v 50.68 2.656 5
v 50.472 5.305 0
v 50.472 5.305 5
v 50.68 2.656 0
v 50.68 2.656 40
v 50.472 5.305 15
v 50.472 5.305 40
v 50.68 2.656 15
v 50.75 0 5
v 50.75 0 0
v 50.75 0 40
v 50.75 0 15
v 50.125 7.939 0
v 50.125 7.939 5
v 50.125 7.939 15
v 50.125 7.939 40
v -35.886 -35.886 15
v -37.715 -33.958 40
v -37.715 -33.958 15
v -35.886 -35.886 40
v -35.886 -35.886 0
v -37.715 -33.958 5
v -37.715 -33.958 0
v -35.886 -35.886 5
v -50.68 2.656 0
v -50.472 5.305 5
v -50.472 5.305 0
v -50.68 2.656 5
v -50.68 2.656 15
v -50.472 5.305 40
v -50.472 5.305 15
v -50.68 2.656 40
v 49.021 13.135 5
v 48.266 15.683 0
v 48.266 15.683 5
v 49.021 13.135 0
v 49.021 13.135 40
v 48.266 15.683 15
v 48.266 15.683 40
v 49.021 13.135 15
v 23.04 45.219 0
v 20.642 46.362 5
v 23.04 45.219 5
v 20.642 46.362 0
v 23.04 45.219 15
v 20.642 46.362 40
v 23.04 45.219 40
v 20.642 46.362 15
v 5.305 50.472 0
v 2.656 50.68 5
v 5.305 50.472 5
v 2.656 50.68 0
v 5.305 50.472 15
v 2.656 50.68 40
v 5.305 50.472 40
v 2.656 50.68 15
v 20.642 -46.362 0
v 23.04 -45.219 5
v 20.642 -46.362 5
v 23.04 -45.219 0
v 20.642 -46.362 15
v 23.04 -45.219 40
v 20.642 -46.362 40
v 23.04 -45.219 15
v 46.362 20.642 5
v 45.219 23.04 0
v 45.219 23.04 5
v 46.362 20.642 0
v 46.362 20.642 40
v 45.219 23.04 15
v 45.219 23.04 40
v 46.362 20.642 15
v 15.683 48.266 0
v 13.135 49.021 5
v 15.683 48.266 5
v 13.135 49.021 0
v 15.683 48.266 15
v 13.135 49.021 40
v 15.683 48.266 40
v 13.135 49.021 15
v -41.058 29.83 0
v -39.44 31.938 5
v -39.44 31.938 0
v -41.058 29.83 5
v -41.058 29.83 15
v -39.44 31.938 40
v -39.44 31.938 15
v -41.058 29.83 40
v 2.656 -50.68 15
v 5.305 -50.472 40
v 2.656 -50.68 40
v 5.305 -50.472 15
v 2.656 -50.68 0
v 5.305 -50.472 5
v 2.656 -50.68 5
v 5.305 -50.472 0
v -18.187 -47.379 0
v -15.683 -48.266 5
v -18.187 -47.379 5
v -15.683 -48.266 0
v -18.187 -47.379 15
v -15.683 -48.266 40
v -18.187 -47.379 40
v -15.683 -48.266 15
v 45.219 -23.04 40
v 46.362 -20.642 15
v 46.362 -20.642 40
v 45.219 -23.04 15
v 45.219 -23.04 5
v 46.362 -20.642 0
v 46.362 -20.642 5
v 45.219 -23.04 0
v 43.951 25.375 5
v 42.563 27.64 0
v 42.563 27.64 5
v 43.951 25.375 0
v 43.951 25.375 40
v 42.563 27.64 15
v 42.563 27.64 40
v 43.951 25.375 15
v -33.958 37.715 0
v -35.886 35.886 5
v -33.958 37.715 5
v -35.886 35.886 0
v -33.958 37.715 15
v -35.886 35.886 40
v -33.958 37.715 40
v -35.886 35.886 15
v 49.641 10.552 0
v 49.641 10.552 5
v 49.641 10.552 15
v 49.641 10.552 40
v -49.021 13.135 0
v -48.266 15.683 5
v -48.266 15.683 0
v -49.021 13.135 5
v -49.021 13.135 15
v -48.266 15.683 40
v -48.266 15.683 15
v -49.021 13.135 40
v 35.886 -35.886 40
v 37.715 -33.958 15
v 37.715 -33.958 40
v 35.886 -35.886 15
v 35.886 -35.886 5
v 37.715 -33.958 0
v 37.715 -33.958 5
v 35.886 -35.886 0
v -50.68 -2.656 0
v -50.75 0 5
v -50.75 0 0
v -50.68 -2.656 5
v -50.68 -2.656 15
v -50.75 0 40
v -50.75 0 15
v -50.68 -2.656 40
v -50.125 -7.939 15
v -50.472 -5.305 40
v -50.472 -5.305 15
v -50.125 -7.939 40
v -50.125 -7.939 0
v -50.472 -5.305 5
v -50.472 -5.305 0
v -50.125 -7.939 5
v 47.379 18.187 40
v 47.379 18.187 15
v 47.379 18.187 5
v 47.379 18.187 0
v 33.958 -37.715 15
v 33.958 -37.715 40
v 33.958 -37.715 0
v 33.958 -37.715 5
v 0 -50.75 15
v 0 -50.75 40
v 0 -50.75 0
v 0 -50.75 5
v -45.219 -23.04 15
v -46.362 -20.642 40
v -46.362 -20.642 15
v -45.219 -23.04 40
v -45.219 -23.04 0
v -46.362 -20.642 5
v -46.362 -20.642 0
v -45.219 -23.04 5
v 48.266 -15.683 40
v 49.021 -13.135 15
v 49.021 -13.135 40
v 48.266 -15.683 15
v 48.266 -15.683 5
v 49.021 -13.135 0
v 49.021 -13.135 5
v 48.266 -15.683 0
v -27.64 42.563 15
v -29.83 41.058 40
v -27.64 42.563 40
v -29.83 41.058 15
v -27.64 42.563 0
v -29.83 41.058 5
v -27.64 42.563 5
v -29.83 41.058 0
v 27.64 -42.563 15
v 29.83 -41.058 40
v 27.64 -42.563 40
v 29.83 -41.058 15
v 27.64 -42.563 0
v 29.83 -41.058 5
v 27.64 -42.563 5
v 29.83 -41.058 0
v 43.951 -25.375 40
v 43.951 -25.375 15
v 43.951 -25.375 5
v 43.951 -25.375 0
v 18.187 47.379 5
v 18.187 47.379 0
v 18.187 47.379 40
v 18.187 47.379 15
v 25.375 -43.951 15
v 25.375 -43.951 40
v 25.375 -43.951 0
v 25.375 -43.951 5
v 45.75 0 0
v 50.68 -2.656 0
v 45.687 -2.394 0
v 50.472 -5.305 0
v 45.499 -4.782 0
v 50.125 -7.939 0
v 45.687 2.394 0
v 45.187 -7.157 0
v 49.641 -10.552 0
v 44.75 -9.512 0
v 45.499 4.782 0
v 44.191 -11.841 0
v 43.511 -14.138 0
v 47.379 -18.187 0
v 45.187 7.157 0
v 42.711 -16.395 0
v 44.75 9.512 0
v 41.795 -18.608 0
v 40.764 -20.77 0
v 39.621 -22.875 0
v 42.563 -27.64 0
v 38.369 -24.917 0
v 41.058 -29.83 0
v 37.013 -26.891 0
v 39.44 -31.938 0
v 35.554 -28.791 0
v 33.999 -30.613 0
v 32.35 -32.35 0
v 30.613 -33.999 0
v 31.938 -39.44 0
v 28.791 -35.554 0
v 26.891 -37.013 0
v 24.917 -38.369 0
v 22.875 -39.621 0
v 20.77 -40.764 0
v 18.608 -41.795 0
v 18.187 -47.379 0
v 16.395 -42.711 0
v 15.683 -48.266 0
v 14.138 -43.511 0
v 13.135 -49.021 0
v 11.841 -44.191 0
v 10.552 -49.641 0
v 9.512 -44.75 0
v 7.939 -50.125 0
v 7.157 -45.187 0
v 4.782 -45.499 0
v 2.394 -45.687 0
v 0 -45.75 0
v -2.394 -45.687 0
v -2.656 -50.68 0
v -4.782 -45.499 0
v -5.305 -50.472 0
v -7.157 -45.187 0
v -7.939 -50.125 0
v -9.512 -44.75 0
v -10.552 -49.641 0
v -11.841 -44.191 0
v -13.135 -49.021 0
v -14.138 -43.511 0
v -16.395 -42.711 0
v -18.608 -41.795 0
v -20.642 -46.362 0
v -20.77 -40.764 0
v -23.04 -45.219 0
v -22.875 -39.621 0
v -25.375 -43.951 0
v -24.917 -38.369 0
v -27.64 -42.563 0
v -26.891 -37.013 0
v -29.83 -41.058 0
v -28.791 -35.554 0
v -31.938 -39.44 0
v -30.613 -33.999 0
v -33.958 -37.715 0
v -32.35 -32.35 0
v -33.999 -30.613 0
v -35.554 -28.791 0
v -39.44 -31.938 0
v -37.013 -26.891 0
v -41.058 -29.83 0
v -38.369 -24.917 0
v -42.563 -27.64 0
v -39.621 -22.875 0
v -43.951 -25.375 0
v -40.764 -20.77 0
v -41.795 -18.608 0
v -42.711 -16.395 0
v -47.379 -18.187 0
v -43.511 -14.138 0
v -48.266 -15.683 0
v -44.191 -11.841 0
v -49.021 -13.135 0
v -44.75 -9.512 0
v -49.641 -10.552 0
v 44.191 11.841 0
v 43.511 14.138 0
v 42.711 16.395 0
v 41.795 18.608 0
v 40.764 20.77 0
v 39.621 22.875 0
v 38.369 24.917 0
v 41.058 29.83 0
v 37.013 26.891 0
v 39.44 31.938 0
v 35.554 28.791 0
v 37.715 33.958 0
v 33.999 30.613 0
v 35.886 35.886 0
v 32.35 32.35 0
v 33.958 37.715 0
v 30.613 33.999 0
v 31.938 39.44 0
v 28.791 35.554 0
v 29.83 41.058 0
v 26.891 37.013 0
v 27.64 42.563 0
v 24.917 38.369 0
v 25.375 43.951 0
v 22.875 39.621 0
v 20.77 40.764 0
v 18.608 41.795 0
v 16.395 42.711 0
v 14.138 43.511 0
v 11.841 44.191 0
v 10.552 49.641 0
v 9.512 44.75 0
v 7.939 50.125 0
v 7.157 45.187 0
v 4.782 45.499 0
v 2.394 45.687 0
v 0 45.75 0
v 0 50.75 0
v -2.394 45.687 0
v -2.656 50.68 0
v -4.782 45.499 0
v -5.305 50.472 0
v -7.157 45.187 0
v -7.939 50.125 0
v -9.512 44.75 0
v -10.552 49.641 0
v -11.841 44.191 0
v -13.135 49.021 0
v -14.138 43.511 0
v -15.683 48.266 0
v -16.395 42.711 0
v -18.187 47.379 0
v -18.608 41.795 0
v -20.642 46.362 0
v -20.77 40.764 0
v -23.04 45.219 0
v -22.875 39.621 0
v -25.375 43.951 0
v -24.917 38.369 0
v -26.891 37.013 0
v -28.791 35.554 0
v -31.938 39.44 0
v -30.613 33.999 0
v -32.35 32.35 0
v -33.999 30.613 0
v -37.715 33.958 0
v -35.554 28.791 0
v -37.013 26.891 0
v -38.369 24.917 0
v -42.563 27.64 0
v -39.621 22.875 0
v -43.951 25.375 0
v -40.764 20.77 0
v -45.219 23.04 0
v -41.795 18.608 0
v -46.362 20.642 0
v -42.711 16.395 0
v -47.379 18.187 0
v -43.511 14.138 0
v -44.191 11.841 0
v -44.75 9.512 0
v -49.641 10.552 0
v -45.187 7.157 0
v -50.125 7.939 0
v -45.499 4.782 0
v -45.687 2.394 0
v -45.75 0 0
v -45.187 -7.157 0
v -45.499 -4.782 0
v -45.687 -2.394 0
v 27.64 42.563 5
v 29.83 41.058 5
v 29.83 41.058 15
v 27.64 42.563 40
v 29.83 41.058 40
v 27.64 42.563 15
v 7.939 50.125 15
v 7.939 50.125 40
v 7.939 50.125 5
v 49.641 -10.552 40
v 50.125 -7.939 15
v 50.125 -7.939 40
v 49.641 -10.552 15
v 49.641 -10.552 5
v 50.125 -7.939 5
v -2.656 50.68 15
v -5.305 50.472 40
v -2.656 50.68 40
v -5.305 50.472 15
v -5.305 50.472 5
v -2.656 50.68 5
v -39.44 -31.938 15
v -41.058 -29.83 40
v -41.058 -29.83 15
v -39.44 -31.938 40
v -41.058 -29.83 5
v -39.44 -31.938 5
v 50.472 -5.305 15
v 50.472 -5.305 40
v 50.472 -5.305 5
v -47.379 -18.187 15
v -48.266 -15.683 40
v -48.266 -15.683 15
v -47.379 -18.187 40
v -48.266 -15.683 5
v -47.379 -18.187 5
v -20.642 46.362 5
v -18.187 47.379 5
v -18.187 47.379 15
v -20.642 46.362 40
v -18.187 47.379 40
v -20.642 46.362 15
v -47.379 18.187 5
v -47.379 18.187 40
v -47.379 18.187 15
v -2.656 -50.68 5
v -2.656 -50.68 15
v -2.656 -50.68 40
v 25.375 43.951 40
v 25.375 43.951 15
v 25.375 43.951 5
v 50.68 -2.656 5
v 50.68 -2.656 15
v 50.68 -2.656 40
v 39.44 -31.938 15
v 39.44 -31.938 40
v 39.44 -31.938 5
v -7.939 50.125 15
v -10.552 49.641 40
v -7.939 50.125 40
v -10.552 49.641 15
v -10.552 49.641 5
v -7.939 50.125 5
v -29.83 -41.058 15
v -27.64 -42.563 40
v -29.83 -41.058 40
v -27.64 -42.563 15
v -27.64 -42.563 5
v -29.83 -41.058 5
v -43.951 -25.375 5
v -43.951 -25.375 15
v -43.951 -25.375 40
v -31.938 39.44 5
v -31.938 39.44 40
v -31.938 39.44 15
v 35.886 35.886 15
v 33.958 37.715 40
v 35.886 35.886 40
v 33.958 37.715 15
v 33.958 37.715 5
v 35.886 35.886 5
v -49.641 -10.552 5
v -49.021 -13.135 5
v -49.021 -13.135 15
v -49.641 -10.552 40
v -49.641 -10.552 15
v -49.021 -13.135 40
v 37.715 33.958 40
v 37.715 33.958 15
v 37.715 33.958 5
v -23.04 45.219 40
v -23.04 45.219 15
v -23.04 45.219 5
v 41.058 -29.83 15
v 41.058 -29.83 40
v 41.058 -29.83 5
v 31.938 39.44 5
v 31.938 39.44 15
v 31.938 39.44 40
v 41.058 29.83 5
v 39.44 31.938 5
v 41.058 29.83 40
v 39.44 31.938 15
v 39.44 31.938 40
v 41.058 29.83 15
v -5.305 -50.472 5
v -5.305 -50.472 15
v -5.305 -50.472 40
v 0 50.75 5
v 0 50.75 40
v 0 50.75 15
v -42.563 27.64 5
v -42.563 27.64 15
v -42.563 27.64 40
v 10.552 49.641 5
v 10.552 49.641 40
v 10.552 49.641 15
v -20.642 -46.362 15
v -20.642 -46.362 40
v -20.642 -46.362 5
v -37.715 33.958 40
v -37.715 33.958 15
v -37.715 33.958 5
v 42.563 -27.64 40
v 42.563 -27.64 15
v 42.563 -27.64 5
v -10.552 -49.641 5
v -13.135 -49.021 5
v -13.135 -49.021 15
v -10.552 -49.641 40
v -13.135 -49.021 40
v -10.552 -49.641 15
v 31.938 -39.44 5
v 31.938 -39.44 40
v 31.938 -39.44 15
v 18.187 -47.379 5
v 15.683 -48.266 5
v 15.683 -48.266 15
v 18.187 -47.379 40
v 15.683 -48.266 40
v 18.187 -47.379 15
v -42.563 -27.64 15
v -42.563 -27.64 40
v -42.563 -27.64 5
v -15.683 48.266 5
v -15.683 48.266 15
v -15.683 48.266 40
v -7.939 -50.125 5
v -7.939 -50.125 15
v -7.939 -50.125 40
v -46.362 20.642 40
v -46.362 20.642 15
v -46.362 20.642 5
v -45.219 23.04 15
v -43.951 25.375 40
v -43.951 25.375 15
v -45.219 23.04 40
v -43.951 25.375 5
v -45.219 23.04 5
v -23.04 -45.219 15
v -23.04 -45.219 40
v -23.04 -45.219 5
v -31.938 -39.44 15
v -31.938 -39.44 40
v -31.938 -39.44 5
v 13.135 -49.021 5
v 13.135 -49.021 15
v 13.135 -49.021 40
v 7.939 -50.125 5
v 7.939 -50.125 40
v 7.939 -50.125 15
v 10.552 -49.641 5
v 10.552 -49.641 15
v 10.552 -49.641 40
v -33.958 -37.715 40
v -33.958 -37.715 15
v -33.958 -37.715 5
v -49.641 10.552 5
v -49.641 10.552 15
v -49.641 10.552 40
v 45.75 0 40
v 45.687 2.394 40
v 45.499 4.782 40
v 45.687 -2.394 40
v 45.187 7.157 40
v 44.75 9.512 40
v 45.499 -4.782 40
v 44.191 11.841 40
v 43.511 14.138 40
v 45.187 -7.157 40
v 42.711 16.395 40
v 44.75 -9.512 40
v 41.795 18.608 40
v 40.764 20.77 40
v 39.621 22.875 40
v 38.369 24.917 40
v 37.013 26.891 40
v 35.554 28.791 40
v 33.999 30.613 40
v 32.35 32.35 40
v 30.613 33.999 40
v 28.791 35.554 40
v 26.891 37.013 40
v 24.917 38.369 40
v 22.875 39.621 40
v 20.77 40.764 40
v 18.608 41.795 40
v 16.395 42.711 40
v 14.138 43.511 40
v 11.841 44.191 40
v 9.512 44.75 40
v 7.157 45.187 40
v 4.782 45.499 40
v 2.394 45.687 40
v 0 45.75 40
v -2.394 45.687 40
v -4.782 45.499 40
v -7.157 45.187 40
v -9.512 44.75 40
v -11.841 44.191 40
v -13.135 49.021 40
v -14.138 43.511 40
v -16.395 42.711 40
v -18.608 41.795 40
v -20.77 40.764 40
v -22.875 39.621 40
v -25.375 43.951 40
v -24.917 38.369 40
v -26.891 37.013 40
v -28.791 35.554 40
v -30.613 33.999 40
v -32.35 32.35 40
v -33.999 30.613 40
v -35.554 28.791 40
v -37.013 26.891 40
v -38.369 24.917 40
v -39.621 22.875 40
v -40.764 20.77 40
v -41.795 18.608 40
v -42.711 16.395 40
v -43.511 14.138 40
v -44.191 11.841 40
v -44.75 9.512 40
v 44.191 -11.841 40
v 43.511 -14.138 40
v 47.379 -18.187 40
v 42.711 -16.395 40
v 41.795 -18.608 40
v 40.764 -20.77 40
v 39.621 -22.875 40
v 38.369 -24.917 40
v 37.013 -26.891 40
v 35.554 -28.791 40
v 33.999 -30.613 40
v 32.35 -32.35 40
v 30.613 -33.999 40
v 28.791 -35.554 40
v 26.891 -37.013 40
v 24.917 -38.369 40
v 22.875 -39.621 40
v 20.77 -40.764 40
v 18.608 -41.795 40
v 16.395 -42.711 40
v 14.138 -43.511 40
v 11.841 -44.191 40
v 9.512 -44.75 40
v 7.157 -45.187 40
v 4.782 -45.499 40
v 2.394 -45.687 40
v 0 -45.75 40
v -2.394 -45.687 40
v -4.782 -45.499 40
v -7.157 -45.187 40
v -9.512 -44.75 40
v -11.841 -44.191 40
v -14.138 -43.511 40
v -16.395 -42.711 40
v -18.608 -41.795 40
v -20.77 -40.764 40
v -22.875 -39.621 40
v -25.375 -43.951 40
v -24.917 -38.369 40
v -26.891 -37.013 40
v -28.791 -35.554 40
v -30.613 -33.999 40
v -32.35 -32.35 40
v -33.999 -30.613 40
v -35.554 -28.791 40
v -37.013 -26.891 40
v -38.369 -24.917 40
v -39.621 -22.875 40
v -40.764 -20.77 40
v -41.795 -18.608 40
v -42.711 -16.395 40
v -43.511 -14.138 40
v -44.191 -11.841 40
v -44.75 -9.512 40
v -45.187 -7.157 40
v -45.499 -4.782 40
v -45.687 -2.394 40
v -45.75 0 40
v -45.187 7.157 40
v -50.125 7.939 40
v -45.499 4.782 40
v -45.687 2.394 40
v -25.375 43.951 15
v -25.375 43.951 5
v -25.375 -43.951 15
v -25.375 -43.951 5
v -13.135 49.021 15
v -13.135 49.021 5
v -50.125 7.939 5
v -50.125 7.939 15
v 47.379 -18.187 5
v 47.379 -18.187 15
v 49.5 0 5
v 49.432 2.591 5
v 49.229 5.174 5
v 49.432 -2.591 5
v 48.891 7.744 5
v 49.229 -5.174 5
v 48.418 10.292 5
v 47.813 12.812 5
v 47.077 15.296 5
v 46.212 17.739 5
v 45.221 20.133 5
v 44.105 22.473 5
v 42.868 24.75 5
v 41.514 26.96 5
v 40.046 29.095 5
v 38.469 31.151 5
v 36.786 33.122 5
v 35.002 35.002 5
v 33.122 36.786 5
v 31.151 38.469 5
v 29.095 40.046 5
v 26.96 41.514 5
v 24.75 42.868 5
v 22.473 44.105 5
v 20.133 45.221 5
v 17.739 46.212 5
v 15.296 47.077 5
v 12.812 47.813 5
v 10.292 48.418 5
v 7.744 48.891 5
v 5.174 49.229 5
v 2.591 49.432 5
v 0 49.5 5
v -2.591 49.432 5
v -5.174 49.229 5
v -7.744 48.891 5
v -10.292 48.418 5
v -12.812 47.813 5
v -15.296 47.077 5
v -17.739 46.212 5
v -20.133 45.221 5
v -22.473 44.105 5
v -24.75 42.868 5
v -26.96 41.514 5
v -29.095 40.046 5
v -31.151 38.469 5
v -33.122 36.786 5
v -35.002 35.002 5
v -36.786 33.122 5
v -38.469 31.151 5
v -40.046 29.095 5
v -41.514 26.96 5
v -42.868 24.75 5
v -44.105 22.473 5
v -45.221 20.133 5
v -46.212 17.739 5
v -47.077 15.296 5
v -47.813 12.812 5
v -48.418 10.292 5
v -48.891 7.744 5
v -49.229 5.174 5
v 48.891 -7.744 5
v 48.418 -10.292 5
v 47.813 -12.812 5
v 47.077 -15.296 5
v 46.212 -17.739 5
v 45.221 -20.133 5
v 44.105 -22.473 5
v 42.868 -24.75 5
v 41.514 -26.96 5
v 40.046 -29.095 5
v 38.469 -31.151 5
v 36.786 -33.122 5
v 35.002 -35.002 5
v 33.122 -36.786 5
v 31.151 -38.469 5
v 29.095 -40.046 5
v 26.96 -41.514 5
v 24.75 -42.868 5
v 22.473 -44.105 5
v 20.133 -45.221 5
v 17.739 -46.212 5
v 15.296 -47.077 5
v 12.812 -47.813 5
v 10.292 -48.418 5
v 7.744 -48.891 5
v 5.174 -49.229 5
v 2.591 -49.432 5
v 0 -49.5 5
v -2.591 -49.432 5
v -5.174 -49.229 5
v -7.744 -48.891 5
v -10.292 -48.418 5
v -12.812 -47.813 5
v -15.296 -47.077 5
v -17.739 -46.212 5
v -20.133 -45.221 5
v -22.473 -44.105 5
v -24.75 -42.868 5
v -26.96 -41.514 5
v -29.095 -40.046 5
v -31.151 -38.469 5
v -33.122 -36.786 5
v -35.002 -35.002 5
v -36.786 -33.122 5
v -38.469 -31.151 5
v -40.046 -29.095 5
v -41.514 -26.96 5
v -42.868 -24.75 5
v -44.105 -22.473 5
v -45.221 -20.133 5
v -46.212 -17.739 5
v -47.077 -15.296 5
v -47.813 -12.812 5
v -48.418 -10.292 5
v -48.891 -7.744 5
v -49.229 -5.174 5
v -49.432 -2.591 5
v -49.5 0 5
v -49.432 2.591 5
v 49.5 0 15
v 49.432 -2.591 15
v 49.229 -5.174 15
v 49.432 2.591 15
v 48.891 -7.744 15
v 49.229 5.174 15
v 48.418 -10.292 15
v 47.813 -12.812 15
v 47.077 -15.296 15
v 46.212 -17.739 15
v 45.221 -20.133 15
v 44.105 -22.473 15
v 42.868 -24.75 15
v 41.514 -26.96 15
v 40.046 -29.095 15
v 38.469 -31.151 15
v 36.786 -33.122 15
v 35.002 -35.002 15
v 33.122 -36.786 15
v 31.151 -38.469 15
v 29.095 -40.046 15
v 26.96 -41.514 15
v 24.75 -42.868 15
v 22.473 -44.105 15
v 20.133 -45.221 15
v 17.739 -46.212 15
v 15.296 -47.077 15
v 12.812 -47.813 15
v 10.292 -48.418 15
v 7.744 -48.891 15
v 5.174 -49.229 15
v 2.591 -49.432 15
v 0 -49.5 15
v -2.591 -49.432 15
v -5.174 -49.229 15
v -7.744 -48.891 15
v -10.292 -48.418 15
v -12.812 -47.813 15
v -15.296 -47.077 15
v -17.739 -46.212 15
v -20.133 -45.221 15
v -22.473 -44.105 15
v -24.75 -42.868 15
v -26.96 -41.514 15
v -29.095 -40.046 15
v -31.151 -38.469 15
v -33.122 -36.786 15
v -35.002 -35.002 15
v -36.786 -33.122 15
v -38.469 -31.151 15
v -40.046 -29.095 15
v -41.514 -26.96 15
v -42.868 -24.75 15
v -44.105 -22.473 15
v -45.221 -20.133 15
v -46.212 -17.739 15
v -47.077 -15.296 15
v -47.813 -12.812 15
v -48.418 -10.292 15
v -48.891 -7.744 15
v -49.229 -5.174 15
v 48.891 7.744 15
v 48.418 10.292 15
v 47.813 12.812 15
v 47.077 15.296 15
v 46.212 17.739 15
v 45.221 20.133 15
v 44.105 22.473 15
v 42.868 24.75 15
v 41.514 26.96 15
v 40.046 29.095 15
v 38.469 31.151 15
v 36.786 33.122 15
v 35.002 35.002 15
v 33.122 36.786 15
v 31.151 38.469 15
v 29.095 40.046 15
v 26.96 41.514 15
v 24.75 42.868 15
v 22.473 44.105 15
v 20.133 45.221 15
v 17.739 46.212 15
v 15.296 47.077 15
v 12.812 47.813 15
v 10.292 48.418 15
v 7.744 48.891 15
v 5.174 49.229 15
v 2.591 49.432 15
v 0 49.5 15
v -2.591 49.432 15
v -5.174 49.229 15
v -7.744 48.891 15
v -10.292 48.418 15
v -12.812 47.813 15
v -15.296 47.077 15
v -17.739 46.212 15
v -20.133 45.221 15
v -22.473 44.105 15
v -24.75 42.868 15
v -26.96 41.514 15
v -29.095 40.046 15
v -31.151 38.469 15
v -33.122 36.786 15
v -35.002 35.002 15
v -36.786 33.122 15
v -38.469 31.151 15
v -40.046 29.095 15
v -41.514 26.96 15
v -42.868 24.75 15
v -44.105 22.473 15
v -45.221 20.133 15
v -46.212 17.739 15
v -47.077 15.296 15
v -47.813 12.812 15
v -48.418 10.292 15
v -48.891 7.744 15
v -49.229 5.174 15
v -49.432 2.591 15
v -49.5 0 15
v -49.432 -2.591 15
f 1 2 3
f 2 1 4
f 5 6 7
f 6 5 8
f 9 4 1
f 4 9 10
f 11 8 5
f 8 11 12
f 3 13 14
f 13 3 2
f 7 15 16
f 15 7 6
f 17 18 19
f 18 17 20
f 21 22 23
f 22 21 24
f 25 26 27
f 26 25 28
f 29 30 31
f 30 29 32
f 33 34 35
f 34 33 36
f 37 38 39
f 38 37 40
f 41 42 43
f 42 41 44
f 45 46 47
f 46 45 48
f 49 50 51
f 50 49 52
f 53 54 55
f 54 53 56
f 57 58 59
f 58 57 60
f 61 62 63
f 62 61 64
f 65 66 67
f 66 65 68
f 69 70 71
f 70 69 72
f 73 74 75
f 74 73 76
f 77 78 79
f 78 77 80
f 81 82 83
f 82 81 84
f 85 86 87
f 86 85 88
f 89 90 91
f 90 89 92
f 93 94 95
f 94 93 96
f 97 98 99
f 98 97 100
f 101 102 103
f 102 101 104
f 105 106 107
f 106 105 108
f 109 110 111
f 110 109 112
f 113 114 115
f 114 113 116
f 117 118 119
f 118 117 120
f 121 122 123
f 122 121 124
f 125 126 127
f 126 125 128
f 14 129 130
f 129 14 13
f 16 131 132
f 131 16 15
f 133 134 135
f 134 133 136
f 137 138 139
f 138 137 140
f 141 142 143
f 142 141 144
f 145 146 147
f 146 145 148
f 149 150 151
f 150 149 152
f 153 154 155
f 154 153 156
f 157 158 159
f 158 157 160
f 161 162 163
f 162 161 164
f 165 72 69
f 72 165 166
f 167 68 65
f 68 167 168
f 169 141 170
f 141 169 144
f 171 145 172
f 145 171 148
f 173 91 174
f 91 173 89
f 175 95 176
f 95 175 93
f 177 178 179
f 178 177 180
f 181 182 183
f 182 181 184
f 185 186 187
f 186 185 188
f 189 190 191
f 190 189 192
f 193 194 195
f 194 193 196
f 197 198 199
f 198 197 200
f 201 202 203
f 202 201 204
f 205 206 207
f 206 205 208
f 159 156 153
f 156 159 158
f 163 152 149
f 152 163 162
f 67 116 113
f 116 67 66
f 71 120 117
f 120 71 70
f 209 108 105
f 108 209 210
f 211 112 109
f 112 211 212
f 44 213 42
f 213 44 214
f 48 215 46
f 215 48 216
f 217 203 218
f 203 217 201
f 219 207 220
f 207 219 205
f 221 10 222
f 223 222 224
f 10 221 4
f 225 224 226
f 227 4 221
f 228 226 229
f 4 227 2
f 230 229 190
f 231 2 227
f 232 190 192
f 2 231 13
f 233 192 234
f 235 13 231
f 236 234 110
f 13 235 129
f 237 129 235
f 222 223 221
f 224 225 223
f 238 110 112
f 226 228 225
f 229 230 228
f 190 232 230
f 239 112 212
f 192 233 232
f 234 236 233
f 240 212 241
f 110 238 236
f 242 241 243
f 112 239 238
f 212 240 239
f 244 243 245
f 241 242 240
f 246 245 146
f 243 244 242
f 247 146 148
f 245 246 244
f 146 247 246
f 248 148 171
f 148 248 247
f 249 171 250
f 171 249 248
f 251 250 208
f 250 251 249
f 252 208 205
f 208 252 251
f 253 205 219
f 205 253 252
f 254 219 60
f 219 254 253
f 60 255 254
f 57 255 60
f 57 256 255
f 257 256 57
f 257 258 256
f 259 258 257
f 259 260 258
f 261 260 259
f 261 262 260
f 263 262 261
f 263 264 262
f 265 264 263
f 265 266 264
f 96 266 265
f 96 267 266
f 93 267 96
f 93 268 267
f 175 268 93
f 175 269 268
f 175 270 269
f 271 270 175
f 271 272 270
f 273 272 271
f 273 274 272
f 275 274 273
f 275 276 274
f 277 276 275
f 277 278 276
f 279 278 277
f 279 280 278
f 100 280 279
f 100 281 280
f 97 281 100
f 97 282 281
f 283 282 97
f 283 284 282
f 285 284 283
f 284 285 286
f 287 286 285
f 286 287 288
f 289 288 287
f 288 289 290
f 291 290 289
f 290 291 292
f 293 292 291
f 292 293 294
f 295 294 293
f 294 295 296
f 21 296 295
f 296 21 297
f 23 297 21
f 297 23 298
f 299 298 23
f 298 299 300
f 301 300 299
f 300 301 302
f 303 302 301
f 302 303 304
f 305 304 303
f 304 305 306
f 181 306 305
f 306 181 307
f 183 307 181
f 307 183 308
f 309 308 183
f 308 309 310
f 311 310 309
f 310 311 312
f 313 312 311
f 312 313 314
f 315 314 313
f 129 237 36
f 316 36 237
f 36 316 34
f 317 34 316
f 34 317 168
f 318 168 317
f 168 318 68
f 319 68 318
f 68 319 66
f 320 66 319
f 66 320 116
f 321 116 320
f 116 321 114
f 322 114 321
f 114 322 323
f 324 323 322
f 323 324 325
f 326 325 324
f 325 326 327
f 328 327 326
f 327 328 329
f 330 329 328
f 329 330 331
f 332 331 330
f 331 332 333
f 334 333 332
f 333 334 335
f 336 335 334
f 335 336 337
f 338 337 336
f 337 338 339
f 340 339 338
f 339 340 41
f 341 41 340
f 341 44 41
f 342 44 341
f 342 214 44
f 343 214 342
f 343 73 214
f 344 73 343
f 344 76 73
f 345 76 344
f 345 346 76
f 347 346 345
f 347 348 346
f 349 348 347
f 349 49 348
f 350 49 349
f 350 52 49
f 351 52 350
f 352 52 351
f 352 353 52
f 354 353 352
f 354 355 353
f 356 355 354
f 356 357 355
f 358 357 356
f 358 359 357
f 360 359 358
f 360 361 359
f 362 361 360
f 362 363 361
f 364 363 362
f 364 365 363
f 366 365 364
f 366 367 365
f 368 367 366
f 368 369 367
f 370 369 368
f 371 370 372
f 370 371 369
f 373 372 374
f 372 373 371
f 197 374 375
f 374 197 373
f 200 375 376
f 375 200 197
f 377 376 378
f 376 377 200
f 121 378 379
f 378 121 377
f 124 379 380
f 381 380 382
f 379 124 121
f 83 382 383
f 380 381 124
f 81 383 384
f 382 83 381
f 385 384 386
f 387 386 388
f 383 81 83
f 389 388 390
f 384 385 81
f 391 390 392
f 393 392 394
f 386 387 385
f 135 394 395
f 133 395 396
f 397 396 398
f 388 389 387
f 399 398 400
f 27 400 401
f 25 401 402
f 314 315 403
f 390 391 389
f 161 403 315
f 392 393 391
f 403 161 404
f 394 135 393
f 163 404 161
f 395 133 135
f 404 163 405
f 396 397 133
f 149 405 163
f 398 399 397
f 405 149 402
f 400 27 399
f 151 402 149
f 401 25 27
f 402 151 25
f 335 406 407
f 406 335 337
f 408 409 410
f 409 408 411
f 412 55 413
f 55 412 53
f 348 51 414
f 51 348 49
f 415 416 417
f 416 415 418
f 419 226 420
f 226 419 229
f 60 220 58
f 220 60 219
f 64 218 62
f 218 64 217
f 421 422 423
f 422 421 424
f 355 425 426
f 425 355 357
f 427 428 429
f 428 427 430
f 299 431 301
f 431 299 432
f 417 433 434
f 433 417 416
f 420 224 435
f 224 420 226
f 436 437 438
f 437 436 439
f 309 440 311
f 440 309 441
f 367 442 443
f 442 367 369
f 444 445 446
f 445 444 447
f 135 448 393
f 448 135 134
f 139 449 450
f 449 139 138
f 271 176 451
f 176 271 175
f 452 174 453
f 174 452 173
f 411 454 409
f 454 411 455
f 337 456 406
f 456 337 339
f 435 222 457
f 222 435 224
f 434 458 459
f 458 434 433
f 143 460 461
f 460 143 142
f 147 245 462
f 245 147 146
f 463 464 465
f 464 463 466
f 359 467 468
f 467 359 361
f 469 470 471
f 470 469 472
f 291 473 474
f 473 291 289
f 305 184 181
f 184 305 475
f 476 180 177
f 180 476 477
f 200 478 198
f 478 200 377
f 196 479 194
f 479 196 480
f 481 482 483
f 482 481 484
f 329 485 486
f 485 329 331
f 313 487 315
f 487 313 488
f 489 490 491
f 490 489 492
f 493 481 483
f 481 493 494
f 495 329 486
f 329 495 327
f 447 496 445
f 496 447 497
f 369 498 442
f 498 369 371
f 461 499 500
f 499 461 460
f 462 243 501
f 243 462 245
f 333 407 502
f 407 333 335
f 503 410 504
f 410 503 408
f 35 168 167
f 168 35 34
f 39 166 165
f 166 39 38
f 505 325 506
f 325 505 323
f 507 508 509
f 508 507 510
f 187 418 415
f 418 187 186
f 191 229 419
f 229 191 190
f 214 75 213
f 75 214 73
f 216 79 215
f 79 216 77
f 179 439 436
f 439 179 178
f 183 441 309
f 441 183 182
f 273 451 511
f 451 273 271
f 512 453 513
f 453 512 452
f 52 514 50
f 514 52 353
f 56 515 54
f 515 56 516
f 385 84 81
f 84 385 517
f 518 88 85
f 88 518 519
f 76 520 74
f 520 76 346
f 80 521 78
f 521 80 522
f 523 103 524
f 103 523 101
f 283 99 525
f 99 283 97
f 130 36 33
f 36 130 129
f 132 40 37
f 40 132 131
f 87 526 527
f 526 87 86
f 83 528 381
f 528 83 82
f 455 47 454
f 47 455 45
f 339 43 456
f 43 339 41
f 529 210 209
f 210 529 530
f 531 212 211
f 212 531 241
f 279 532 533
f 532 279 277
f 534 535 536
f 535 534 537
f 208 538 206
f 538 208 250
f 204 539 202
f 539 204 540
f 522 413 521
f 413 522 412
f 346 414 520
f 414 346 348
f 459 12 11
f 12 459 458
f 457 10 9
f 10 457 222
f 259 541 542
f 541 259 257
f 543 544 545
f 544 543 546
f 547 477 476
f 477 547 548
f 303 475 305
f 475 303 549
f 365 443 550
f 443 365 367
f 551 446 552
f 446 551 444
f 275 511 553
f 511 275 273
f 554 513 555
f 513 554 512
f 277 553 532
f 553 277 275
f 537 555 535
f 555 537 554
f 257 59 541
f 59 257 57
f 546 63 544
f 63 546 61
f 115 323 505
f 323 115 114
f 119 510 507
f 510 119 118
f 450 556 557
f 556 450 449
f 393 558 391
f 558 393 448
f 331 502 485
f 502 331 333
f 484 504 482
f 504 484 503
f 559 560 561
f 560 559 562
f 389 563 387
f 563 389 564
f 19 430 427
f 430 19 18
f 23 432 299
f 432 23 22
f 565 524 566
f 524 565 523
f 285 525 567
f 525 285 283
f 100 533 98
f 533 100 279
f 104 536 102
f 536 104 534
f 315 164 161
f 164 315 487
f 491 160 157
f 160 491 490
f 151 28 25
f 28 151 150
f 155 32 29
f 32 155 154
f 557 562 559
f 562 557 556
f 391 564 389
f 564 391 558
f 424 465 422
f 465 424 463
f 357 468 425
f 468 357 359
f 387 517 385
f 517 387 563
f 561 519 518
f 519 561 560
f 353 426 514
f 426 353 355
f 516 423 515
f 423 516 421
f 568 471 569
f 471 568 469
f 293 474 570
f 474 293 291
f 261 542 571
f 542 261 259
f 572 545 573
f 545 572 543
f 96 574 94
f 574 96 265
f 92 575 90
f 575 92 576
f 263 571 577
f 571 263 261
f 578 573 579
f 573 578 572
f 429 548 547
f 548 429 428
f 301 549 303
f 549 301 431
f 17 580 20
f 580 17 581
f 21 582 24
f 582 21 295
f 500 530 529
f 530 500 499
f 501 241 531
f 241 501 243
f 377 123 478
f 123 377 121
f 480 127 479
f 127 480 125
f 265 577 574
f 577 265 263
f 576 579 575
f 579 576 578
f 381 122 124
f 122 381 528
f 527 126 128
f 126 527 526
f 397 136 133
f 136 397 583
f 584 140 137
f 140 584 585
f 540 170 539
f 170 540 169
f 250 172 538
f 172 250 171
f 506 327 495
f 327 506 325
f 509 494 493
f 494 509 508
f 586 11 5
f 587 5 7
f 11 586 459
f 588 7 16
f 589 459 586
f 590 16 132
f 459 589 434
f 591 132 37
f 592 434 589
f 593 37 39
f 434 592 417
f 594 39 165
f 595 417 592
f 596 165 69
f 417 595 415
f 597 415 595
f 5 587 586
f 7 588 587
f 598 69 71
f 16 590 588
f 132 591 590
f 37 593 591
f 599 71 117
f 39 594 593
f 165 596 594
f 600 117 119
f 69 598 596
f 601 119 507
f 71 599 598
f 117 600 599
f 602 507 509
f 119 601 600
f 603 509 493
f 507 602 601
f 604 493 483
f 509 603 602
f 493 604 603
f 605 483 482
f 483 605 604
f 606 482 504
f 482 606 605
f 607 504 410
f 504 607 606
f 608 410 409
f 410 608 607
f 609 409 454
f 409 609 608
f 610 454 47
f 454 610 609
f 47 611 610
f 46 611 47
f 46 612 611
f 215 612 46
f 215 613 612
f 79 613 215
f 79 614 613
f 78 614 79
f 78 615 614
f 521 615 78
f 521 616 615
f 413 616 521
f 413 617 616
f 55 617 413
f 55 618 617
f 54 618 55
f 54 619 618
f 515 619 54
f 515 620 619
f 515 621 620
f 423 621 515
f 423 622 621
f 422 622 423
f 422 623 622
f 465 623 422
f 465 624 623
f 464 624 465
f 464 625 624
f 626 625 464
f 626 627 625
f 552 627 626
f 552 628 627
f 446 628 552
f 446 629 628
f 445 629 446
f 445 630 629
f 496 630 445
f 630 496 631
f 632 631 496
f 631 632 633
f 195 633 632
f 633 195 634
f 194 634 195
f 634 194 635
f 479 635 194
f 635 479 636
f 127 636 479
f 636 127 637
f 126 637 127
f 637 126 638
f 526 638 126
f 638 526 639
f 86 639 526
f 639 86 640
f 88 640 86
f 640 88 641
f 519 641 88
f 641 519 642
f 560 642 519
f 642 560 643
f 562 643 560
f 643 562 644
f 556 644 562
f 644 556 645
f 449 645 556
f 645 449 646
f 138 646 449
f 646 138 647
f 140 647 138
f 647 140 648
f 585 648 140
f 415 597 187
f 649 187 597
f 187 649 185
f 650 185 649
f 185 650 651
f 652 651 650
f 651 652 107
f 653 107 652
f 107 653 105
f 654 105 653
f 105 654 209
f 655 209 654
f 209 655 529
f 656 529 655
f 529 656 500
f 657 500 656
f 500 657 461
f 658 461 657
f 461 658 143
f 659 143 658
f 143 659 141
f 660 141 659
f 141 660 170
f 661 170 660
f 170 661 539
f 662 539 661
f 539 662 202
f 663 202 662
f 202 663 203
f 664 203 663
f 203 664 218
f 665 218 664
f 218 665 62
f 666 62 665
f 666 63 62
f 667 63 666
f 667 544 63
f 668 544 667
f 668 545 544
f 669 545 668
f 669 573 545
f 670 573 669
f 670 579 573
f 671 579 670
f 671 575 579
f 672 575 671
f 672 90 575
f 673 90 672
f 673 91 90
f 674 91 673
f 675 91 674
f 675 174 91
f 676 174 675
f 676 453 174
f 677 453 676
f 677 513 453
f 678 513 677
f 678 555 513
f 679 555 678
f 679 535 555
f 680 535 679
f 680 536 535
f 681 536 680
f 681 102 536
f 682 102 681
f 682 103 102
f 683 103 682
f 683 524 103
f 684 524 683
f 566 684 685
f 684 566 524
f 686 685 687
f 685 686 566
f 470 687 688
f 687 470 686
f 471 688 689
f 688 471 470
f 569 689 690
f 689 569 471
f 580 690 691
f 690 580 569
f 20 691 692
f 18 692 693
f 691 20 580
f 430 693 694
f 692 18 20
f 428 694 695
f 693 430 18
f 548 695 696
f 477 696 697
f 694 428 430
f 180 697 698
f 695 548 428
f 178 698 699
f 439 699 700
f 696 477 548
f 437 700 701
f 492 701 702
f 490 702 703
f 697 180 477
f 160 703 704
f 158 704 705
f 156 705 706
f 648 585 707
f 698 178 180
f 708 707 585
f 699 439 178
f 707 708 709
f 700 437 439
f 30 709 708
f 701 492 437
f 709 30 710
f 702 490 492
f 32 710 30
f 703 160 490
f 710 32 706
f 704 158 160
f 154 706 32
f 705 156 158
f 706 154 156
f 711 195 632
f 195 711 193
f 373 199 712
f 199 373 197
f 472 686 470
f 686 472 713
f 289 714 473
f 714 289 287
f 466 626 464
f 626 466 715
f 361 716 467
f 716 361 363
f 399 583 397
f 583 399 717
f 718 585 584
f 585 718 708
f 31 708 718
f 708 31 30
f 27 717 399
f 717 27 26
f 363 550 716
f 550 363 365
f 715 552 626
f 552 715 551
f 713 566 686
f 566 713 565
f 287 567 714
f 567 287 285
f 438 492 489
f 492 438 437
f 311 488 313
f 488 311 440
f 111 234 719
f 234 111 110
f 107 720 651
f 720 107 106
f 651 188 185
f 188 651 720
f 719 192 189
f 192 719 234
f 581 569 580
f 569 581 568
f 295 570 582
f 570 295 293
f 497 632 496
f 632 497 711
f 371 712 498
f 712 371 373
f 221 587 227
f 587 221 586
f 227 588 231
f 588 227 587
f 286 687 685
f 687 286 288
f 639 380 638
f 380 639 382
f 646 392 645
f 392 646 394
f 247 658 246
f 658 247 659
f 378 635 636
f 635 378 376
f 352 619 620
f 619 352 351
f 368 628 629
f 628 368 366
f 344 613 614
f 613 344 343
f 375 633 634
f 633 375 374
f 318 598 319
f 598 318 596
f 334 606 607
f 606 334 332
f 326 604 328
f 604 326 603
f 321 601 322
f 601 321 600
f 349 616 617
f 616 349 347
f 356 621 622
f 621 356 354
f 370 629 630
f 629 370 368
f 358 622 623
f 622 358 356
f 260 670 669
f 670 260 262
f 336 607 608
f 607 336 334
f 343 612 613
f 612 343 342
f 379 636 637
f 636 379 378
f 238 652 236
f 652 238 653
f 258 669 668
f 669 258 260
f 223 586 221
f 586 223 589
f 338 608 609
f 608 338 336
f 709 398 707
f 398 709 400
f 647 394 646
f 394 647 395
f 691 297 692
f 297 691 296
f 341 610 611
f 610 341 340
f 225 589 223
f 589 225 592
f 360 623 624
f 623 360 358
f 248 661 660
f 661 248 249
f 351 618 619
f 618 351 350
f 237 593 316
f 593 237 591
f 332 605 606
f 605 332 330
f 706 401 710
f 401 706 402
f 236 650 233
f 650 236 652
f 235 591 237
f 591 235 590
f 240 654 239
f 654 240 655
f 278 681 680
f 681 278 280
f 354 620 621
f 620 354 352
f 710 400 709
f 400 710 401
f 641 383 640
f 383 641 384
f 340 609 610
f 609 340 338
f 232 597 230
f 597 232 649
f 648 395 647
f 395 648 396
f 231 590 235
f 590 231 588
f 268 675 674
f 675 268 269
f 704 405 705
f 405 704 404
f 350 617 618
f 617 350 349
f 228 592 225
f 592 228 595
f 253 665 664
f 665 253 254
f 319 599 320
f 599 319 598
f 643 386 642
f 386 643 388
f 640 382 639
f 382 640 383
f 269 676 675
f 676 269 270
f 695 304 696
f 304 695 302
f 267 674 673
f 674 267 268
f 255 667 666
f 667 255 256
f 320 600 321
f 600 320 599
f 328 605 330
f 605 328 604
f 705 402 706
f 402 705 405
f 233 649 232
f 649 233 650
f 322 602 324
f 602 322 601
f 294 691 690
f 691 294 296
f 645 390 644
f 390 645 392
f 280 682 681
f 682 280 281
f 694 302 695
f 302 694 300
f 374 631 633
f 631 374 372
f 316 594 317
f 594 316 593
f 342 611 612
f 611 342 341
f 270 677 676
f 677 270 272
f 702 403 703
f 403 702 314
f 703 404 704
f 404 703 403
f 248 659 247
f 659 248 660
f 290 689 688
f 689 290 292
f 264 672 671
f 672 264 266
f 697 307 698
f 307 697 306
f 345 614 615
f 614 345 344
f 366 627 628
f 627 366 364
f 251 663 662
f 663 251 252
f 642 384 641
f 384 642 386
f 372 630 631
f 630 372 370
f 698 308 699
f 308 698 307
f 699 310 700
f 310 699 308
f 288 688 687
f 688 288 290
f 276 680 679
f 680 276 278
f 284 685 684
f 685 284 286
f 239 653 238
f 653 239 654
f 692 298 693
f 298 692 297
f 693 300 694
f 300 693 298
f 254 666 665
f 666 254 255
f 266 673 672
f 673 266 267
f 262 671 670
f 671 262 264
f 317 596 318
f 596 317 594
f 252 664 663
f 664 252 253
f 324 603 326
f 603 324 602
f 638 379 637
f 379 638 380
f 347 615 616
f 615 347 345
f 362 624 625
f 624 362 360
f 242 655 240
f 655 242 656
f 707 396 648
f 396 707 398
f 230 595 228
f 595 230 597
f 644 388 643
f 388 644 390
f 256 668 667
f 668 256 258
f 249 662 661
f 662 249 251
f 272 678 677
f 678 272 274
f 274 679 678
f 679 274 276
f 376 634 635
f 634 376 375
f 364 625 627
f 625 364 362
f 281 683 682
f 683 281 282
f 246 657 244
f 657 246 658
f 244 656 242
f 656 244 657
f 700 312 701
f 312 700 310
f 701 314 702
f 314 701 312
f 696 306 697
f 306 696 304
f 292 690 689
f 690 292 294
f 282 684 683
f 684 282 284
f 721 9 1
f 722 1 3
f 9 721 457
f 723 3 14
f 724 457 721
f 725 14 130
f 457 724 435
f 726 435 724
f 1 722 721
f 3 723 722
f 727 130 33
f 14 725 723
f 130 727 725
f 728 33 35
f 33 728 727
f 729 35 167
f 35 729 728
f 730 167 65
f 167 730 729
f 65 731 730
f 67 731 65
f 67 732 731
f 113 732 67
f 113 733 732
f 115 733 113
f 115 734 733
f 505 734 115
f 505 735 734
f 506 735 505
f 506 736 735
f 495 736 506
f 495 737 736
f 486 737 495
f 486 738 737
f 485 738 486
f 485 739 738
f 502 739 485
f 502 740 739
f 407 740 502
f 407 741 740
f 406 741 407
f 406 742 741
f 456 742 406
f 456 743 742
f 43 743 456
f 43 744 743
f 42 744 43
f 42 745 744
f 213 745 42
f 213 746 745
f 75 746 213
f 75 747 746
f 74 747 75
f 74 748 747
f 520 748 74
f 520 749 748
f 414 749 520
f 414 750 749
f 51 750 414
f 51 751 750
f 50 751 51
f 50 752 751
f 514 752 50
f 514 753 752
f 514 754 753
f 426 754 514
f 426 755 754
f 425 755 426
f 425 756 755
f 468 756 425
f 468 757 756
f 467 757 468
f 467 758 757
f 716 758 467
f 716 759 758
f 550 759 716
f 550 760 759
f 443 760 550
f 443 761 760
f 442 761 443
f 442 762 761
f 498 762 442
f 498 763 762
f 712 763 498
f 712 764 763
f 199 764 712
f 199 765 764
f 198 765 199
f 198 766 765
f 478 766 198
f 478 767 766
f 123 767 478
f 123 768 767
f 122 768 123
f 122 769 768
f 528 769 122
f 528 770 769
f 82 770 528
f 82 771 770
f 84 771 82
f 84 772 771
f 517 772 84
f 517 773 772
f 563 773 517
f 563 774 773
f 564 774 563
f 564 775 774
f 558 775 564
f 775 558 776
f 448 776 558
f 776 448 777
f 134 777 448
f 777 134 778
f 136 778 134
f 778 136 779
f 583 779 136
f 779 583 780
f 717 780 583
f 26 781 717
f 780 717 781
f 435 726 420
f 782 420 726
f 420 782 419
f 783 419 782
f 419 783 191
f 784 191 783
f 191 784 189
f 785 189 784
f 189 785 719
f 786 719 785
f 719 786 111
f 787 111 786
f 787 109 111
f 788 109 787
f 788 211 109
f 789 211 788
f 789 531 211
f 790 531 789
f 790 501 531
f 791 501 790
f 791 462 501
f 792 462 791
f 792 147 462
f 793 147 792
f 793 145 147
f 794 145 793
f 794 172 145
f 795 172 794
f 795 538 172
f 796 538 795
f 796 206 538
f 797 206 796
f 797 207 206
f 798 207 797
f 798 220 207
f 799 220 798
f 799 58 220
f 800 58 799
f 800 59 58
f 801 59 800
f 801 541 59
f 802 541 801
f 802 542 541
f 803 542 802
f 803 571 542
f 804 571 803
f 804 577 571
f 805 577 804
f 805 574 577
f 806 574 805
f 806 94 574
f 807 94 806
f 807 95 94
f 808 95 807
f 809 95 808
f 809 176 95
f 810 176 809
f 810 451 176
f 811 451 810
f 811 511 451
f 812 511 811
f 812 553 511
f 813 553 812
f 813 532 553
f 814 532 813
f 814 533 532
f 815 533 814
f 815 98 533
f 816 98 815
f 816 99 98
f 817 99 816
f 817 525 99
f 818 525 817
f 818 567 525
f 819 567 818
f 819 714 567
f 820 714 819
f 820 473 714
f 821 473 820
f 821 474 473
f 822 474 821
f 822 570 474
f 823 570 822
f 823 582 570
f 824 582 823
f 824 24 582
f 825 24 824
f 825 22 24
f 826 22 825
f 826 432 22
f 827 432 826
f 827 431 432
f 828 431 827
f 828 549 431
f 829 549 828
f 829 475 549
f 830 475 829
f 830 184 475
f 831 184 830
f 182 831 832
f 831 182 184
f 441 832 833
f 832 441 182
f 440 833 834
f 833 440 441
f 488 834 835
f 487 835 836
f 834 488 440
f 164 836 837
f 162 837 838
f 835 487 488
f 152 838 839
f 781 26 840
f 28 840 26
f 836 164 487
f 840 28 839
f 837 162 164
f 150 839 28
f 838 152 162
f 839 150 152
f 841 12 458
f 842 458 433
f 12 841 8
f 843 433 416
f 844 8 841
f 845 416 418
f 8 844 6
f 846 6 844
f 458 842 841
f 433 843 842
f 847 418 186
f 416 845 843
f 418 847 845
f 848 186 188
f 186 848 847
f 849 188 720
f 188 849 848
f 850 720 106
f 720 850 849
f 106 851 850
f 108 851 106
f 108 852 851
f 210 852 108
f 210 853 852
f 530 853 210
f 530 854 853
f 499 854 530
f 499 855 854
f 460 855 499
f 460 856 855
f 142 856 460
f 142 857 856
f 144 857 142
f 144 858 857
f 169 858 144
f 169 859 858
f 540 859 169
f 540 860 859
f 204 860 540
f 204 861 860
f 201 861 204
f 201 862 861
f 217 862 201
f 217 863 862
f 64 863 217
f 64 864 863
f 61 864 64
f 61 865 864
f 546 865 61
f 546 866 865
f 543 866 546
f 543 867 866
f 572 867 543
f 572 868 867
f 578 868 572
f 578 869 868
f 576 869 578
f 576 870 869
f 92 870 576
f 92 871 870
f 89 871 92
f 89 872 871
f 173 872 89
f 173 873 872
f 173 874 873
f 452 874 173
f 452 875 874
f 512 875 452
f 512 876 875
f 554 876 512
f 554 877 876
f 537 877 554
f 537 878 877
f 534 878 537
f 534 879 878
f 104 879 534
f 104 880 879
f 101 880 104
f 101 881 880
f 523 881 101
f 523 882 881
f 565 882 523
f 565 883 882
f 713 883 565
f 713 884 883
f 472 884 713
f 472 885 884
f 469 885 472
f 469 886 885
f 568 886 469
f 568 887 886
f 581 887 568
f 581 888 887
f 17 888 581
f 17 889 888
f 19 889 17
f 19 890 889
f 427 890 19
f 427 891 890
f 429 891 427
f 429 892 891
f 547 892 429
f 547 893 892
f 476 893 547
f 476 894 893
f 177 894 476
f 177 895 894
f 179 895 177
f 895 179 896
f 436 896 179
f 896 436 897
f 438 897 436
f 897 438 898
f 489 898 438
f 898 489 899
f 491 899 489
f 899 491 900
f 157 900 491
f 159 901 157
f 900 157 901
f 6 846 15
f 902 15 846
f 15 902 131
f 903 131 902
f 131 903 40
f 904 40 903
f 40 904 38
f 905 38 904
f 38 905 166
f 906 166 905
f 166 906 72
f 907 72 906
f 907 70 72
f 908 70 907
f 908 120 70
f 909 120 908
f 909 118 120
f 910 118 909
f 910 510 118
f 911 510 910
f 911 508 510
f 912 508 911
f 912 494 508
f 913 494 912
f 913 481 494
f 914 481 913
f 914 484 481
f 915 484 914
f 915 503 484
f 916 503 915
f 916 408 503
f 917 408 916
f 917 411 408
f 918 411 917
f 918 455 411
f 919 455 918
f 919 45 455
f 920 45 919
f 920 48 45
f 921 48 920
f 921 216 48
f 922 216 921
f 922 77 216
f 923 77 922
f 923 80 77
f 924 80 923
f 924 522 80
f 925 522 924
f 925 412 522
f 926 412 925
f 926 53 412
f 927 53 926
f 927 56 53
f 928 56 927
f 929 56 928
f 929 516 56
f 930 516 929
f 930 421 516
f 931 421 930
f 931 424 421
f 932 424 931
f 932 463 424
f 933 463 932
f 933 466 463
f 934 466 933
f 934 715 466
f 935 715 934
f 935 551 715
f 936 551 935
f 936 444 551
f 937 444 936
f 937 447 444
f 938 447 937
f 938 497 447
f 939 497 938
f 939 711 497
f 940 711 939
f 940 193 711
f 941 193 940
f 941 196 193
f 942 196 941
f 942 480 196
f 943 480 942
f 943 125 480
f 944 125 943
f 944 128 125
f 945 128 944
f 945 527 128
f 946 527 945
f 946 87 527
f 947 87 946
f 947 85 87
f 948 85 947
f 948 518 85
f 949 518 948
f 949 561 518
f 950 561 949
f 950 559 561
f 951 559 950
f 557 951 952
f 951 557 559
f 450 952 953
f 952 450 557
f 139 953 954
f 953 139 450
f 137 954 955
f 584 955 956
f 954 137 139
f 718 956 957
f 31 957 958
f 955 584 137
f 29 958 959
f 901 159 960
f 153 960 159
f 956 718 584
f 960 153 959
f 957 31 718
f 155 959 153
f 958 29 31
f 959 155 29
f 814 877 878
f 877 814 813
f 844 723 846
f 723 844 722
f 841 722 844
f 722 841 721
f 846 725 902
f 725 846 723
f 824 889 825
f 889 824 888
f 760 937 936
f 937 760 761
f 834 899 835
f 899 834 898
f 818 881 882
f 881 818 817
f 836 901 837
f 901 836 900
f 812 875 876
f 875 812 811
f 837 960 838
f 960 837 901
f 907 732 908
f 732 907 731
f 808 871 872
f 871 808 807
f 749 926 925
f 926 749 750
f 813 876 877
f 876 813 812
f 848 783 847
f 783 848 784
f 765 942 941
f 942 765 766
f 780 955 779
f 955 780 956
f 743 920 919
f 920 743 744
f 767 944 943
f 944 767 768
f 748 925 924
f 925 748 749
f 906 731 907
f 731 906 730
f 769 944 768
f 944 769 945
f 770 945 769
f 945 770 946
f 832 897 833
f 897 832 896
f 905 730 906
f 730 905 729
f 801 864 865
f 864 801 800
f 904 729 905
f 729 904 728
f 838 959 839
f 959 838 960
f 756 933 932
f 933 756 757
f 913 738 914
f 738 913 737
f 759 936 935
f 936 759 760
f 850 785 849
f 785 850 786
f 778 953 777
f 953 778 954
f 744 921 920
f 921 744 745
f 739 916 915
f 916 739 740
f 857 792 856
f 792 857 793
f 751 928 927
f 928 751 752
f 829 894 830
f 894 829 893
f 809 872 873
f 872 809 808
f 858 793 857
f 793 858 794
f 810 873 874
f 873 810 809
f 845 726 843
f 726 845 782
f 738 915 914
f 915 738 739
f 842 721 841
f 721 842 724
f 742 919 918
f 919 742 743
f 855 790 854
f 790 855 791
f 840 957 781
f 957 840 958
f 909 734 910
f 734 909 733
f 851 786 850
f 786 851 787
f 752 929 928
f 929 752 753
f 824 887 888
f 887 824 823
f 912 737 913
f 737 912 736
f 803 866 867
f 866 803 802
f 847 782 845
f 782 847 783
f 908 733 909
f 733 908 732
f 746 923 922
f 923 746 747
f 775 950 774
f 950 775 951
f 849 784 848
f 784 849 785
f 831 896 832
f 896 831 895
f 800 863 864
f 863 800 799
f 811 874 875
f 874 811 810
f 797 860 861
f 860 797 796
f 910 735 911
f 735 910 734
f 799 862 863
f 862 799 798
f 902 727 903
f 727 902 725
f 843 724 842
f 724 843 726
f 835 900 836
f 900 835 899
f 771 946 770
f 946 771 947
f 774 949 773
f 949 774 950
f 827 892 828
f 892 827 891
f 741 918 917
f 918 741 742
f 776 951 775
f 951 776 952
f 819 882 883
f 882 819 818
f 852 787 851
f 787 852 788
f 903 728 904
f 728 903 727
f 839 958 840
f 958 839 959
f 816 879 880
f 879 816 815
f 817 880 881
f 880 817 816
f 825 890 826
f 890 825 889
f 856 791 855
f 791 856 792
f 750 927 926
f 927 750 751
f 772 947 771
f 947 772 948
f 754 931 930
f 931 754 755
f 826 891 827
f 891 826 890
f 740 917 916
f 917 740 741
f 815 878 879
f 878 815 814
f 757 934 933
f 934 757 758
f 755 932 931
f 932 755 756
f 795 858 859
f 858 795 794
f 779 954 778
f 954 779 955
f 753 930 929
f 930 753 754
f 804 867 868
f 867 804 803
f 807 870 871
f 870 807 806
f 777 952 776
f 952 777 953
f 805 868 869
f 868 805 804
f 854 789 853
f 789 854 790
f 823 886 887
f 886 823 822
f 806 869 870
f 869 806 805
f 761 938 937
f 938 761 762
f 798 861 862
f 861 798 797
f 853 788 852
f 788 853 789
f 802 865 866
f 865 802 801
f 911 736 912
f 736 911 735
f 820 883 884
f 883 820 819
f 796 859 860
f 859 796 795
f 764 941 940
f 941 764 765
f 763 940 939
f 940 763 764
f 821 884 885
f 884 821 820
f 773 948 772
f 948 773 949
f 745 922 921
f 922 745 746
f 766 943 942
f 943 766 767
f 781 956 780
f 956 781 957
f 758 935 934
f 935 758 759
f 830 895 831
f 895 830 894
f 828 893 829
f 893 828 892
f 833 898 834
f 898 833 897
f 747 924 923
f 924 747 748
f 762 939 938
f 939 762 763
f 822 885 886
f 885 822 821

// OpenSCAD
$fn=120;
wall_thickness = 5;
section_length = 40;

ring_length = 10;
ring_offset = 5;

int_dia = 91.5;
ext_dia = int_dia + 2 * wall_thickness;
echo(ext_dia);


module tube() {
    difference() {
        cylinder(section_length, d = ext_dia);
        cylinder(section_length, d = int_dia);
    }
}

module ring() {
    difference() {
        cylinder(ring_length, d = ext_dia);
        cylinder(ring_length, d = ext_dia - wall_thickness/2);
    }
}
  
module end() {
    difference() {
        tube();
        translate([0, 0, ring_offset]) ring();
    }
}

end();


    
    
